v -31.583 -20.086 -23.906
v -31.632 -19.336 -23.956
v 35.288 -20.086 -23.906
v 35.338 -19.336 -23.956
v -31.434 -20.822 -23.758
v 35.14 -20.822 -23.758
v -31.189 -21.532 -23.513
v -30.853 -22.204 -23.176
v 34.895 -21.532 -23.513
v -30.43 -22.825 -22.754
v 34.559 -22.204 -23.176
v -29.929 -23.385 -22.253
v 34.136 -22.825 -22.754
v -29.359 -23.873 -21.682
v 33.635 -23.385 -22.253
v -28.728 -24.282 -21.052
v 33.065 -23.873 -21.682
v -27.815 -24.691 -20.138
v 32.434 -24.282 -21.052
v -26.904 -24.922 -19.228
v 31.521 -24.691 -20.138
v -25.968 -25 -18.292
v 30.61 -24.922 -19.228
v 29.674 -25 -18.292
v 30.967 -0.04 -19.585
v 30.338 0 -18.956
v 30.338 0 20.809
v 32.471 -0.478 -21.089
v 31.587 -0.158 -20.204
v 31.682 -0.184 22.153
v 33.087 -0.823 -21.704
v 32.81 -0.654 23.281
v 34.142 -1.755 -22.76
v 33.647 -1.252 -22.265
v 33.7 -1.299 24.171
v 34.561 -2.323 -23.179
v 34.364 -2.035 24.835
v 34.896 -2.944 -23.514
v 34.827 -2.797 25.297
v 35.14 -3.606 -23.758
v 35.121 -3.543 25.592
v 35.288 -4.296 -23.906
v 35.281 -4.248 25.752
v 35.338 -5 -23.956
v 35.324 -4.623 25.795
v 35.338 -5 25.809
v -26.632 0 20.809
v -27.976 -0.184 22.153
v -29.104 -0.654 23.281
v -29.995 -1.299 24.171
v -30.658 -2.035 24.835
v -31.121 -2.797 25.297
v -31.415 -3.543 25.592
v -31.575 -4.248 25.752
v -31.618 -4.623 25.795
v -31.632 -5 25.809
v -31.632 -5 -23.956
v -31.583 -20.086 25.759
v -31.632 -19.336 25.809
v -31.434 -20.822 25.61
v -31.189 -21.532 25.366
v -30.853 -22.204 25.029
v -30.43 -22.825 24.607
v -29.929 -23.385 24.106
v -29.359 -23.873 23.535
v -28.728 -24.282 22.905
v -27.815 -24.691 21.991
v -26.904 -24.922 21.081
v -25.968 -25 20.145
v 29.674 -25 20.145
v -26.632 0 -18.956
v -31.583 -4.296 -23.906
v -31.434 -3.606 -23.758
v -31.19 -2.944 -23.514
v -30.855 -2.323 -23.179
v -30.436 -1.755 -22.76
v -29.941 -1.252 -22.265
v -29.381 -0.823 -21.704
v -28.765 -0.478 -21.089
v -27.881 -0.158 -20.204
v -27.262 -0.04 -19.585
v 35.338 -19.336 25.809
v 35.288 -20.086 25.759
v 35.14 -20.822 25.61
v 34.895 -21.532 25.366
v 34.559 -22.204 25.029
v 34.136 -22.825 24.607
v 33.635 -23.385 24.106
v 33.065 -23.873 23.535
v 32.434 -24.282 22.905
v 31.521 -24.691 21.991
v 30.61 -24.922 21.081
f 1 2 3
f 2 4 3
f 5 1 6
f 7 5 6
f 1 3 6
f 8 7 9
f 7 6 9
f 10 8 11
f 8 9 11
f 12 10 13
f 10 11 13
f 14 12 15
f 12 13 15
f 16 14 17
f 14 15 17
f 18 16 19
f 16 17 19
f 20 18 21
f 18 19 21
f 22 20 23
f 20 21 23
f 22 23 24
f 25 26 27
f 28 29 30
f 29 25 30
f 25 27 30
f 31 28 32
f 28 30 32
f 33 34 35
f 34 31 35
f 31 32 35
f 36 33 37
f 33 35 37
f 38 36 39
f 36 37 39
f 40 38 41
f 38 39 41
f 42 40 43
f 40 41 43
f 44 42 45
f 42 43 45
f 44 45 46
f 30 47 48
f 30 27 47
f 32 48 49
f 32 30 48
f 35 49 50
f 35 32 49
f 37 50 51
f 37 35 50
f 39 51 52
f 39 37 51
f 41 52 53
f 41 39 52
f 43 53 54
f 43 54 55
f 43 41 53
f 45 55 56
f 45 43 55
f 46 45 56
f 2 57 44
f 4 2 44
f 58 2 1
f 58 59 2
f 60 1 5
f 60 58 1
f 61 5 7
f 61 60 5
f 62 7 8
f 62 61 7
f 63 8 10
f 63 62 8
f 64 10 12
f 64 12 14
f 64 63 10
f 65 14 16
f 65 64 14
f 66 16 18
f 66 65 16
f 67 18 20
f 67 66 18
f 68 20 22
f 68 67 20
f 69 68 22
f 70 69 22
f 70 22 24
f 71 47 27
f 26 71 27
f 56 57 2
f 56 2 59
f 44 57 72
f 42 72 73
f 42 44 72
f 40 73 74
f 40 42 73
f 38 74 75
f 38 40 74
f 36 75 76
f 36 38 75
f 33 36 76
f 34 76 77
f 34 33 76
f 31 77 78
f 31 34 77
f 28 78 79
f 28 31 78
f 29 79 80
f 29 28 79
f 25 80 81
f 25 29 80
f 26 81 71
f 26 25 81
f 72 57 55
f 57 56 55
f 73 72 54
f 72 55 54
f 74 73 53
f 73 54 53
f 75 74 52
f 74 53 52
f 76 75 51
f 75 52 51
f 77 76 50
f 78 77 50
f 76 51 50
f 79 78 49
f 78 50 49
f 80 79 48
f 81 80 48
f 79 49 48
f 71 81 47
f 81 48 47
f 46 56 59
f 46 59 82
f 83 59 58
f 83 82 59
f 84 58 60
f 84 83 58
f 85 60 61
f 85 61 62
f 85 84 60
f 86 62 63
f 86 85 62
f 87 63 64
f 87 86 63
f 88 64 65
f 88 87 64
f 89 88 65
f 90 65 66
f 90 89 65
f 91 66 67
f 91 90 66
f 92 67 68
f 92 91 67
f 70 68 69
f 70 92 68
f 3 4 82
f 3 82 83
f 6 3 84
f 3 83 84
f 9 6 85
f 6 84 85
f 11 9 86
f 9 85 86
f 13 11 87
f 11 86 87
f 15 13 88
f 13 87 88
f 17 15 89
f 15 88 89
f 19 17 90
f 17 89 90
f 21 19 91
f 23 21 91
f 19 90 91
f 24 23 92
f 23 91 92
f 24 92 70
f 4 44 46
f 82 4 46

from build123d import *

# Parameters (mm, degrees)
F0_W     = 66.970591
F0_H     = 49.764709
F1_DEPTH = 25
F2_R     = 5.663986
F3_R     = 5


with BuildPart() as f1:
    # F0 (on Front) → F1 (new body)
    with BuildSketch(Plane.XZ):
        with Locations((1.852942, 0.926471)):
            Rectangle(F0_W, F0_H)
    extrude(amount=F1_DEPTH)

    # F2
    f2_edges = [f1.edges().sort_by_distance(p)[0] for p in [
        (1.852943, -25, 25.808826),
        (-31.632353, -25, 0.926471),
        (1.852943, -25, -23.955883),
        (35.338238, -25, 0.926471),
    ]]
    fillet(f2_edges, radius=F2_R)

    # F3
    f3_edges = [f1.edges().sort_by_distance(p)[0] for p in [
        (1.852943, 0, 25.808826),
        (-31.632353, 0, 0.926471),
        (1.852943, 0, -23.955883),
        (35.338238, 0, 0.926471),
    ]]
    fillet(f3_edges, radius=F3_R)


solid = f1.part
